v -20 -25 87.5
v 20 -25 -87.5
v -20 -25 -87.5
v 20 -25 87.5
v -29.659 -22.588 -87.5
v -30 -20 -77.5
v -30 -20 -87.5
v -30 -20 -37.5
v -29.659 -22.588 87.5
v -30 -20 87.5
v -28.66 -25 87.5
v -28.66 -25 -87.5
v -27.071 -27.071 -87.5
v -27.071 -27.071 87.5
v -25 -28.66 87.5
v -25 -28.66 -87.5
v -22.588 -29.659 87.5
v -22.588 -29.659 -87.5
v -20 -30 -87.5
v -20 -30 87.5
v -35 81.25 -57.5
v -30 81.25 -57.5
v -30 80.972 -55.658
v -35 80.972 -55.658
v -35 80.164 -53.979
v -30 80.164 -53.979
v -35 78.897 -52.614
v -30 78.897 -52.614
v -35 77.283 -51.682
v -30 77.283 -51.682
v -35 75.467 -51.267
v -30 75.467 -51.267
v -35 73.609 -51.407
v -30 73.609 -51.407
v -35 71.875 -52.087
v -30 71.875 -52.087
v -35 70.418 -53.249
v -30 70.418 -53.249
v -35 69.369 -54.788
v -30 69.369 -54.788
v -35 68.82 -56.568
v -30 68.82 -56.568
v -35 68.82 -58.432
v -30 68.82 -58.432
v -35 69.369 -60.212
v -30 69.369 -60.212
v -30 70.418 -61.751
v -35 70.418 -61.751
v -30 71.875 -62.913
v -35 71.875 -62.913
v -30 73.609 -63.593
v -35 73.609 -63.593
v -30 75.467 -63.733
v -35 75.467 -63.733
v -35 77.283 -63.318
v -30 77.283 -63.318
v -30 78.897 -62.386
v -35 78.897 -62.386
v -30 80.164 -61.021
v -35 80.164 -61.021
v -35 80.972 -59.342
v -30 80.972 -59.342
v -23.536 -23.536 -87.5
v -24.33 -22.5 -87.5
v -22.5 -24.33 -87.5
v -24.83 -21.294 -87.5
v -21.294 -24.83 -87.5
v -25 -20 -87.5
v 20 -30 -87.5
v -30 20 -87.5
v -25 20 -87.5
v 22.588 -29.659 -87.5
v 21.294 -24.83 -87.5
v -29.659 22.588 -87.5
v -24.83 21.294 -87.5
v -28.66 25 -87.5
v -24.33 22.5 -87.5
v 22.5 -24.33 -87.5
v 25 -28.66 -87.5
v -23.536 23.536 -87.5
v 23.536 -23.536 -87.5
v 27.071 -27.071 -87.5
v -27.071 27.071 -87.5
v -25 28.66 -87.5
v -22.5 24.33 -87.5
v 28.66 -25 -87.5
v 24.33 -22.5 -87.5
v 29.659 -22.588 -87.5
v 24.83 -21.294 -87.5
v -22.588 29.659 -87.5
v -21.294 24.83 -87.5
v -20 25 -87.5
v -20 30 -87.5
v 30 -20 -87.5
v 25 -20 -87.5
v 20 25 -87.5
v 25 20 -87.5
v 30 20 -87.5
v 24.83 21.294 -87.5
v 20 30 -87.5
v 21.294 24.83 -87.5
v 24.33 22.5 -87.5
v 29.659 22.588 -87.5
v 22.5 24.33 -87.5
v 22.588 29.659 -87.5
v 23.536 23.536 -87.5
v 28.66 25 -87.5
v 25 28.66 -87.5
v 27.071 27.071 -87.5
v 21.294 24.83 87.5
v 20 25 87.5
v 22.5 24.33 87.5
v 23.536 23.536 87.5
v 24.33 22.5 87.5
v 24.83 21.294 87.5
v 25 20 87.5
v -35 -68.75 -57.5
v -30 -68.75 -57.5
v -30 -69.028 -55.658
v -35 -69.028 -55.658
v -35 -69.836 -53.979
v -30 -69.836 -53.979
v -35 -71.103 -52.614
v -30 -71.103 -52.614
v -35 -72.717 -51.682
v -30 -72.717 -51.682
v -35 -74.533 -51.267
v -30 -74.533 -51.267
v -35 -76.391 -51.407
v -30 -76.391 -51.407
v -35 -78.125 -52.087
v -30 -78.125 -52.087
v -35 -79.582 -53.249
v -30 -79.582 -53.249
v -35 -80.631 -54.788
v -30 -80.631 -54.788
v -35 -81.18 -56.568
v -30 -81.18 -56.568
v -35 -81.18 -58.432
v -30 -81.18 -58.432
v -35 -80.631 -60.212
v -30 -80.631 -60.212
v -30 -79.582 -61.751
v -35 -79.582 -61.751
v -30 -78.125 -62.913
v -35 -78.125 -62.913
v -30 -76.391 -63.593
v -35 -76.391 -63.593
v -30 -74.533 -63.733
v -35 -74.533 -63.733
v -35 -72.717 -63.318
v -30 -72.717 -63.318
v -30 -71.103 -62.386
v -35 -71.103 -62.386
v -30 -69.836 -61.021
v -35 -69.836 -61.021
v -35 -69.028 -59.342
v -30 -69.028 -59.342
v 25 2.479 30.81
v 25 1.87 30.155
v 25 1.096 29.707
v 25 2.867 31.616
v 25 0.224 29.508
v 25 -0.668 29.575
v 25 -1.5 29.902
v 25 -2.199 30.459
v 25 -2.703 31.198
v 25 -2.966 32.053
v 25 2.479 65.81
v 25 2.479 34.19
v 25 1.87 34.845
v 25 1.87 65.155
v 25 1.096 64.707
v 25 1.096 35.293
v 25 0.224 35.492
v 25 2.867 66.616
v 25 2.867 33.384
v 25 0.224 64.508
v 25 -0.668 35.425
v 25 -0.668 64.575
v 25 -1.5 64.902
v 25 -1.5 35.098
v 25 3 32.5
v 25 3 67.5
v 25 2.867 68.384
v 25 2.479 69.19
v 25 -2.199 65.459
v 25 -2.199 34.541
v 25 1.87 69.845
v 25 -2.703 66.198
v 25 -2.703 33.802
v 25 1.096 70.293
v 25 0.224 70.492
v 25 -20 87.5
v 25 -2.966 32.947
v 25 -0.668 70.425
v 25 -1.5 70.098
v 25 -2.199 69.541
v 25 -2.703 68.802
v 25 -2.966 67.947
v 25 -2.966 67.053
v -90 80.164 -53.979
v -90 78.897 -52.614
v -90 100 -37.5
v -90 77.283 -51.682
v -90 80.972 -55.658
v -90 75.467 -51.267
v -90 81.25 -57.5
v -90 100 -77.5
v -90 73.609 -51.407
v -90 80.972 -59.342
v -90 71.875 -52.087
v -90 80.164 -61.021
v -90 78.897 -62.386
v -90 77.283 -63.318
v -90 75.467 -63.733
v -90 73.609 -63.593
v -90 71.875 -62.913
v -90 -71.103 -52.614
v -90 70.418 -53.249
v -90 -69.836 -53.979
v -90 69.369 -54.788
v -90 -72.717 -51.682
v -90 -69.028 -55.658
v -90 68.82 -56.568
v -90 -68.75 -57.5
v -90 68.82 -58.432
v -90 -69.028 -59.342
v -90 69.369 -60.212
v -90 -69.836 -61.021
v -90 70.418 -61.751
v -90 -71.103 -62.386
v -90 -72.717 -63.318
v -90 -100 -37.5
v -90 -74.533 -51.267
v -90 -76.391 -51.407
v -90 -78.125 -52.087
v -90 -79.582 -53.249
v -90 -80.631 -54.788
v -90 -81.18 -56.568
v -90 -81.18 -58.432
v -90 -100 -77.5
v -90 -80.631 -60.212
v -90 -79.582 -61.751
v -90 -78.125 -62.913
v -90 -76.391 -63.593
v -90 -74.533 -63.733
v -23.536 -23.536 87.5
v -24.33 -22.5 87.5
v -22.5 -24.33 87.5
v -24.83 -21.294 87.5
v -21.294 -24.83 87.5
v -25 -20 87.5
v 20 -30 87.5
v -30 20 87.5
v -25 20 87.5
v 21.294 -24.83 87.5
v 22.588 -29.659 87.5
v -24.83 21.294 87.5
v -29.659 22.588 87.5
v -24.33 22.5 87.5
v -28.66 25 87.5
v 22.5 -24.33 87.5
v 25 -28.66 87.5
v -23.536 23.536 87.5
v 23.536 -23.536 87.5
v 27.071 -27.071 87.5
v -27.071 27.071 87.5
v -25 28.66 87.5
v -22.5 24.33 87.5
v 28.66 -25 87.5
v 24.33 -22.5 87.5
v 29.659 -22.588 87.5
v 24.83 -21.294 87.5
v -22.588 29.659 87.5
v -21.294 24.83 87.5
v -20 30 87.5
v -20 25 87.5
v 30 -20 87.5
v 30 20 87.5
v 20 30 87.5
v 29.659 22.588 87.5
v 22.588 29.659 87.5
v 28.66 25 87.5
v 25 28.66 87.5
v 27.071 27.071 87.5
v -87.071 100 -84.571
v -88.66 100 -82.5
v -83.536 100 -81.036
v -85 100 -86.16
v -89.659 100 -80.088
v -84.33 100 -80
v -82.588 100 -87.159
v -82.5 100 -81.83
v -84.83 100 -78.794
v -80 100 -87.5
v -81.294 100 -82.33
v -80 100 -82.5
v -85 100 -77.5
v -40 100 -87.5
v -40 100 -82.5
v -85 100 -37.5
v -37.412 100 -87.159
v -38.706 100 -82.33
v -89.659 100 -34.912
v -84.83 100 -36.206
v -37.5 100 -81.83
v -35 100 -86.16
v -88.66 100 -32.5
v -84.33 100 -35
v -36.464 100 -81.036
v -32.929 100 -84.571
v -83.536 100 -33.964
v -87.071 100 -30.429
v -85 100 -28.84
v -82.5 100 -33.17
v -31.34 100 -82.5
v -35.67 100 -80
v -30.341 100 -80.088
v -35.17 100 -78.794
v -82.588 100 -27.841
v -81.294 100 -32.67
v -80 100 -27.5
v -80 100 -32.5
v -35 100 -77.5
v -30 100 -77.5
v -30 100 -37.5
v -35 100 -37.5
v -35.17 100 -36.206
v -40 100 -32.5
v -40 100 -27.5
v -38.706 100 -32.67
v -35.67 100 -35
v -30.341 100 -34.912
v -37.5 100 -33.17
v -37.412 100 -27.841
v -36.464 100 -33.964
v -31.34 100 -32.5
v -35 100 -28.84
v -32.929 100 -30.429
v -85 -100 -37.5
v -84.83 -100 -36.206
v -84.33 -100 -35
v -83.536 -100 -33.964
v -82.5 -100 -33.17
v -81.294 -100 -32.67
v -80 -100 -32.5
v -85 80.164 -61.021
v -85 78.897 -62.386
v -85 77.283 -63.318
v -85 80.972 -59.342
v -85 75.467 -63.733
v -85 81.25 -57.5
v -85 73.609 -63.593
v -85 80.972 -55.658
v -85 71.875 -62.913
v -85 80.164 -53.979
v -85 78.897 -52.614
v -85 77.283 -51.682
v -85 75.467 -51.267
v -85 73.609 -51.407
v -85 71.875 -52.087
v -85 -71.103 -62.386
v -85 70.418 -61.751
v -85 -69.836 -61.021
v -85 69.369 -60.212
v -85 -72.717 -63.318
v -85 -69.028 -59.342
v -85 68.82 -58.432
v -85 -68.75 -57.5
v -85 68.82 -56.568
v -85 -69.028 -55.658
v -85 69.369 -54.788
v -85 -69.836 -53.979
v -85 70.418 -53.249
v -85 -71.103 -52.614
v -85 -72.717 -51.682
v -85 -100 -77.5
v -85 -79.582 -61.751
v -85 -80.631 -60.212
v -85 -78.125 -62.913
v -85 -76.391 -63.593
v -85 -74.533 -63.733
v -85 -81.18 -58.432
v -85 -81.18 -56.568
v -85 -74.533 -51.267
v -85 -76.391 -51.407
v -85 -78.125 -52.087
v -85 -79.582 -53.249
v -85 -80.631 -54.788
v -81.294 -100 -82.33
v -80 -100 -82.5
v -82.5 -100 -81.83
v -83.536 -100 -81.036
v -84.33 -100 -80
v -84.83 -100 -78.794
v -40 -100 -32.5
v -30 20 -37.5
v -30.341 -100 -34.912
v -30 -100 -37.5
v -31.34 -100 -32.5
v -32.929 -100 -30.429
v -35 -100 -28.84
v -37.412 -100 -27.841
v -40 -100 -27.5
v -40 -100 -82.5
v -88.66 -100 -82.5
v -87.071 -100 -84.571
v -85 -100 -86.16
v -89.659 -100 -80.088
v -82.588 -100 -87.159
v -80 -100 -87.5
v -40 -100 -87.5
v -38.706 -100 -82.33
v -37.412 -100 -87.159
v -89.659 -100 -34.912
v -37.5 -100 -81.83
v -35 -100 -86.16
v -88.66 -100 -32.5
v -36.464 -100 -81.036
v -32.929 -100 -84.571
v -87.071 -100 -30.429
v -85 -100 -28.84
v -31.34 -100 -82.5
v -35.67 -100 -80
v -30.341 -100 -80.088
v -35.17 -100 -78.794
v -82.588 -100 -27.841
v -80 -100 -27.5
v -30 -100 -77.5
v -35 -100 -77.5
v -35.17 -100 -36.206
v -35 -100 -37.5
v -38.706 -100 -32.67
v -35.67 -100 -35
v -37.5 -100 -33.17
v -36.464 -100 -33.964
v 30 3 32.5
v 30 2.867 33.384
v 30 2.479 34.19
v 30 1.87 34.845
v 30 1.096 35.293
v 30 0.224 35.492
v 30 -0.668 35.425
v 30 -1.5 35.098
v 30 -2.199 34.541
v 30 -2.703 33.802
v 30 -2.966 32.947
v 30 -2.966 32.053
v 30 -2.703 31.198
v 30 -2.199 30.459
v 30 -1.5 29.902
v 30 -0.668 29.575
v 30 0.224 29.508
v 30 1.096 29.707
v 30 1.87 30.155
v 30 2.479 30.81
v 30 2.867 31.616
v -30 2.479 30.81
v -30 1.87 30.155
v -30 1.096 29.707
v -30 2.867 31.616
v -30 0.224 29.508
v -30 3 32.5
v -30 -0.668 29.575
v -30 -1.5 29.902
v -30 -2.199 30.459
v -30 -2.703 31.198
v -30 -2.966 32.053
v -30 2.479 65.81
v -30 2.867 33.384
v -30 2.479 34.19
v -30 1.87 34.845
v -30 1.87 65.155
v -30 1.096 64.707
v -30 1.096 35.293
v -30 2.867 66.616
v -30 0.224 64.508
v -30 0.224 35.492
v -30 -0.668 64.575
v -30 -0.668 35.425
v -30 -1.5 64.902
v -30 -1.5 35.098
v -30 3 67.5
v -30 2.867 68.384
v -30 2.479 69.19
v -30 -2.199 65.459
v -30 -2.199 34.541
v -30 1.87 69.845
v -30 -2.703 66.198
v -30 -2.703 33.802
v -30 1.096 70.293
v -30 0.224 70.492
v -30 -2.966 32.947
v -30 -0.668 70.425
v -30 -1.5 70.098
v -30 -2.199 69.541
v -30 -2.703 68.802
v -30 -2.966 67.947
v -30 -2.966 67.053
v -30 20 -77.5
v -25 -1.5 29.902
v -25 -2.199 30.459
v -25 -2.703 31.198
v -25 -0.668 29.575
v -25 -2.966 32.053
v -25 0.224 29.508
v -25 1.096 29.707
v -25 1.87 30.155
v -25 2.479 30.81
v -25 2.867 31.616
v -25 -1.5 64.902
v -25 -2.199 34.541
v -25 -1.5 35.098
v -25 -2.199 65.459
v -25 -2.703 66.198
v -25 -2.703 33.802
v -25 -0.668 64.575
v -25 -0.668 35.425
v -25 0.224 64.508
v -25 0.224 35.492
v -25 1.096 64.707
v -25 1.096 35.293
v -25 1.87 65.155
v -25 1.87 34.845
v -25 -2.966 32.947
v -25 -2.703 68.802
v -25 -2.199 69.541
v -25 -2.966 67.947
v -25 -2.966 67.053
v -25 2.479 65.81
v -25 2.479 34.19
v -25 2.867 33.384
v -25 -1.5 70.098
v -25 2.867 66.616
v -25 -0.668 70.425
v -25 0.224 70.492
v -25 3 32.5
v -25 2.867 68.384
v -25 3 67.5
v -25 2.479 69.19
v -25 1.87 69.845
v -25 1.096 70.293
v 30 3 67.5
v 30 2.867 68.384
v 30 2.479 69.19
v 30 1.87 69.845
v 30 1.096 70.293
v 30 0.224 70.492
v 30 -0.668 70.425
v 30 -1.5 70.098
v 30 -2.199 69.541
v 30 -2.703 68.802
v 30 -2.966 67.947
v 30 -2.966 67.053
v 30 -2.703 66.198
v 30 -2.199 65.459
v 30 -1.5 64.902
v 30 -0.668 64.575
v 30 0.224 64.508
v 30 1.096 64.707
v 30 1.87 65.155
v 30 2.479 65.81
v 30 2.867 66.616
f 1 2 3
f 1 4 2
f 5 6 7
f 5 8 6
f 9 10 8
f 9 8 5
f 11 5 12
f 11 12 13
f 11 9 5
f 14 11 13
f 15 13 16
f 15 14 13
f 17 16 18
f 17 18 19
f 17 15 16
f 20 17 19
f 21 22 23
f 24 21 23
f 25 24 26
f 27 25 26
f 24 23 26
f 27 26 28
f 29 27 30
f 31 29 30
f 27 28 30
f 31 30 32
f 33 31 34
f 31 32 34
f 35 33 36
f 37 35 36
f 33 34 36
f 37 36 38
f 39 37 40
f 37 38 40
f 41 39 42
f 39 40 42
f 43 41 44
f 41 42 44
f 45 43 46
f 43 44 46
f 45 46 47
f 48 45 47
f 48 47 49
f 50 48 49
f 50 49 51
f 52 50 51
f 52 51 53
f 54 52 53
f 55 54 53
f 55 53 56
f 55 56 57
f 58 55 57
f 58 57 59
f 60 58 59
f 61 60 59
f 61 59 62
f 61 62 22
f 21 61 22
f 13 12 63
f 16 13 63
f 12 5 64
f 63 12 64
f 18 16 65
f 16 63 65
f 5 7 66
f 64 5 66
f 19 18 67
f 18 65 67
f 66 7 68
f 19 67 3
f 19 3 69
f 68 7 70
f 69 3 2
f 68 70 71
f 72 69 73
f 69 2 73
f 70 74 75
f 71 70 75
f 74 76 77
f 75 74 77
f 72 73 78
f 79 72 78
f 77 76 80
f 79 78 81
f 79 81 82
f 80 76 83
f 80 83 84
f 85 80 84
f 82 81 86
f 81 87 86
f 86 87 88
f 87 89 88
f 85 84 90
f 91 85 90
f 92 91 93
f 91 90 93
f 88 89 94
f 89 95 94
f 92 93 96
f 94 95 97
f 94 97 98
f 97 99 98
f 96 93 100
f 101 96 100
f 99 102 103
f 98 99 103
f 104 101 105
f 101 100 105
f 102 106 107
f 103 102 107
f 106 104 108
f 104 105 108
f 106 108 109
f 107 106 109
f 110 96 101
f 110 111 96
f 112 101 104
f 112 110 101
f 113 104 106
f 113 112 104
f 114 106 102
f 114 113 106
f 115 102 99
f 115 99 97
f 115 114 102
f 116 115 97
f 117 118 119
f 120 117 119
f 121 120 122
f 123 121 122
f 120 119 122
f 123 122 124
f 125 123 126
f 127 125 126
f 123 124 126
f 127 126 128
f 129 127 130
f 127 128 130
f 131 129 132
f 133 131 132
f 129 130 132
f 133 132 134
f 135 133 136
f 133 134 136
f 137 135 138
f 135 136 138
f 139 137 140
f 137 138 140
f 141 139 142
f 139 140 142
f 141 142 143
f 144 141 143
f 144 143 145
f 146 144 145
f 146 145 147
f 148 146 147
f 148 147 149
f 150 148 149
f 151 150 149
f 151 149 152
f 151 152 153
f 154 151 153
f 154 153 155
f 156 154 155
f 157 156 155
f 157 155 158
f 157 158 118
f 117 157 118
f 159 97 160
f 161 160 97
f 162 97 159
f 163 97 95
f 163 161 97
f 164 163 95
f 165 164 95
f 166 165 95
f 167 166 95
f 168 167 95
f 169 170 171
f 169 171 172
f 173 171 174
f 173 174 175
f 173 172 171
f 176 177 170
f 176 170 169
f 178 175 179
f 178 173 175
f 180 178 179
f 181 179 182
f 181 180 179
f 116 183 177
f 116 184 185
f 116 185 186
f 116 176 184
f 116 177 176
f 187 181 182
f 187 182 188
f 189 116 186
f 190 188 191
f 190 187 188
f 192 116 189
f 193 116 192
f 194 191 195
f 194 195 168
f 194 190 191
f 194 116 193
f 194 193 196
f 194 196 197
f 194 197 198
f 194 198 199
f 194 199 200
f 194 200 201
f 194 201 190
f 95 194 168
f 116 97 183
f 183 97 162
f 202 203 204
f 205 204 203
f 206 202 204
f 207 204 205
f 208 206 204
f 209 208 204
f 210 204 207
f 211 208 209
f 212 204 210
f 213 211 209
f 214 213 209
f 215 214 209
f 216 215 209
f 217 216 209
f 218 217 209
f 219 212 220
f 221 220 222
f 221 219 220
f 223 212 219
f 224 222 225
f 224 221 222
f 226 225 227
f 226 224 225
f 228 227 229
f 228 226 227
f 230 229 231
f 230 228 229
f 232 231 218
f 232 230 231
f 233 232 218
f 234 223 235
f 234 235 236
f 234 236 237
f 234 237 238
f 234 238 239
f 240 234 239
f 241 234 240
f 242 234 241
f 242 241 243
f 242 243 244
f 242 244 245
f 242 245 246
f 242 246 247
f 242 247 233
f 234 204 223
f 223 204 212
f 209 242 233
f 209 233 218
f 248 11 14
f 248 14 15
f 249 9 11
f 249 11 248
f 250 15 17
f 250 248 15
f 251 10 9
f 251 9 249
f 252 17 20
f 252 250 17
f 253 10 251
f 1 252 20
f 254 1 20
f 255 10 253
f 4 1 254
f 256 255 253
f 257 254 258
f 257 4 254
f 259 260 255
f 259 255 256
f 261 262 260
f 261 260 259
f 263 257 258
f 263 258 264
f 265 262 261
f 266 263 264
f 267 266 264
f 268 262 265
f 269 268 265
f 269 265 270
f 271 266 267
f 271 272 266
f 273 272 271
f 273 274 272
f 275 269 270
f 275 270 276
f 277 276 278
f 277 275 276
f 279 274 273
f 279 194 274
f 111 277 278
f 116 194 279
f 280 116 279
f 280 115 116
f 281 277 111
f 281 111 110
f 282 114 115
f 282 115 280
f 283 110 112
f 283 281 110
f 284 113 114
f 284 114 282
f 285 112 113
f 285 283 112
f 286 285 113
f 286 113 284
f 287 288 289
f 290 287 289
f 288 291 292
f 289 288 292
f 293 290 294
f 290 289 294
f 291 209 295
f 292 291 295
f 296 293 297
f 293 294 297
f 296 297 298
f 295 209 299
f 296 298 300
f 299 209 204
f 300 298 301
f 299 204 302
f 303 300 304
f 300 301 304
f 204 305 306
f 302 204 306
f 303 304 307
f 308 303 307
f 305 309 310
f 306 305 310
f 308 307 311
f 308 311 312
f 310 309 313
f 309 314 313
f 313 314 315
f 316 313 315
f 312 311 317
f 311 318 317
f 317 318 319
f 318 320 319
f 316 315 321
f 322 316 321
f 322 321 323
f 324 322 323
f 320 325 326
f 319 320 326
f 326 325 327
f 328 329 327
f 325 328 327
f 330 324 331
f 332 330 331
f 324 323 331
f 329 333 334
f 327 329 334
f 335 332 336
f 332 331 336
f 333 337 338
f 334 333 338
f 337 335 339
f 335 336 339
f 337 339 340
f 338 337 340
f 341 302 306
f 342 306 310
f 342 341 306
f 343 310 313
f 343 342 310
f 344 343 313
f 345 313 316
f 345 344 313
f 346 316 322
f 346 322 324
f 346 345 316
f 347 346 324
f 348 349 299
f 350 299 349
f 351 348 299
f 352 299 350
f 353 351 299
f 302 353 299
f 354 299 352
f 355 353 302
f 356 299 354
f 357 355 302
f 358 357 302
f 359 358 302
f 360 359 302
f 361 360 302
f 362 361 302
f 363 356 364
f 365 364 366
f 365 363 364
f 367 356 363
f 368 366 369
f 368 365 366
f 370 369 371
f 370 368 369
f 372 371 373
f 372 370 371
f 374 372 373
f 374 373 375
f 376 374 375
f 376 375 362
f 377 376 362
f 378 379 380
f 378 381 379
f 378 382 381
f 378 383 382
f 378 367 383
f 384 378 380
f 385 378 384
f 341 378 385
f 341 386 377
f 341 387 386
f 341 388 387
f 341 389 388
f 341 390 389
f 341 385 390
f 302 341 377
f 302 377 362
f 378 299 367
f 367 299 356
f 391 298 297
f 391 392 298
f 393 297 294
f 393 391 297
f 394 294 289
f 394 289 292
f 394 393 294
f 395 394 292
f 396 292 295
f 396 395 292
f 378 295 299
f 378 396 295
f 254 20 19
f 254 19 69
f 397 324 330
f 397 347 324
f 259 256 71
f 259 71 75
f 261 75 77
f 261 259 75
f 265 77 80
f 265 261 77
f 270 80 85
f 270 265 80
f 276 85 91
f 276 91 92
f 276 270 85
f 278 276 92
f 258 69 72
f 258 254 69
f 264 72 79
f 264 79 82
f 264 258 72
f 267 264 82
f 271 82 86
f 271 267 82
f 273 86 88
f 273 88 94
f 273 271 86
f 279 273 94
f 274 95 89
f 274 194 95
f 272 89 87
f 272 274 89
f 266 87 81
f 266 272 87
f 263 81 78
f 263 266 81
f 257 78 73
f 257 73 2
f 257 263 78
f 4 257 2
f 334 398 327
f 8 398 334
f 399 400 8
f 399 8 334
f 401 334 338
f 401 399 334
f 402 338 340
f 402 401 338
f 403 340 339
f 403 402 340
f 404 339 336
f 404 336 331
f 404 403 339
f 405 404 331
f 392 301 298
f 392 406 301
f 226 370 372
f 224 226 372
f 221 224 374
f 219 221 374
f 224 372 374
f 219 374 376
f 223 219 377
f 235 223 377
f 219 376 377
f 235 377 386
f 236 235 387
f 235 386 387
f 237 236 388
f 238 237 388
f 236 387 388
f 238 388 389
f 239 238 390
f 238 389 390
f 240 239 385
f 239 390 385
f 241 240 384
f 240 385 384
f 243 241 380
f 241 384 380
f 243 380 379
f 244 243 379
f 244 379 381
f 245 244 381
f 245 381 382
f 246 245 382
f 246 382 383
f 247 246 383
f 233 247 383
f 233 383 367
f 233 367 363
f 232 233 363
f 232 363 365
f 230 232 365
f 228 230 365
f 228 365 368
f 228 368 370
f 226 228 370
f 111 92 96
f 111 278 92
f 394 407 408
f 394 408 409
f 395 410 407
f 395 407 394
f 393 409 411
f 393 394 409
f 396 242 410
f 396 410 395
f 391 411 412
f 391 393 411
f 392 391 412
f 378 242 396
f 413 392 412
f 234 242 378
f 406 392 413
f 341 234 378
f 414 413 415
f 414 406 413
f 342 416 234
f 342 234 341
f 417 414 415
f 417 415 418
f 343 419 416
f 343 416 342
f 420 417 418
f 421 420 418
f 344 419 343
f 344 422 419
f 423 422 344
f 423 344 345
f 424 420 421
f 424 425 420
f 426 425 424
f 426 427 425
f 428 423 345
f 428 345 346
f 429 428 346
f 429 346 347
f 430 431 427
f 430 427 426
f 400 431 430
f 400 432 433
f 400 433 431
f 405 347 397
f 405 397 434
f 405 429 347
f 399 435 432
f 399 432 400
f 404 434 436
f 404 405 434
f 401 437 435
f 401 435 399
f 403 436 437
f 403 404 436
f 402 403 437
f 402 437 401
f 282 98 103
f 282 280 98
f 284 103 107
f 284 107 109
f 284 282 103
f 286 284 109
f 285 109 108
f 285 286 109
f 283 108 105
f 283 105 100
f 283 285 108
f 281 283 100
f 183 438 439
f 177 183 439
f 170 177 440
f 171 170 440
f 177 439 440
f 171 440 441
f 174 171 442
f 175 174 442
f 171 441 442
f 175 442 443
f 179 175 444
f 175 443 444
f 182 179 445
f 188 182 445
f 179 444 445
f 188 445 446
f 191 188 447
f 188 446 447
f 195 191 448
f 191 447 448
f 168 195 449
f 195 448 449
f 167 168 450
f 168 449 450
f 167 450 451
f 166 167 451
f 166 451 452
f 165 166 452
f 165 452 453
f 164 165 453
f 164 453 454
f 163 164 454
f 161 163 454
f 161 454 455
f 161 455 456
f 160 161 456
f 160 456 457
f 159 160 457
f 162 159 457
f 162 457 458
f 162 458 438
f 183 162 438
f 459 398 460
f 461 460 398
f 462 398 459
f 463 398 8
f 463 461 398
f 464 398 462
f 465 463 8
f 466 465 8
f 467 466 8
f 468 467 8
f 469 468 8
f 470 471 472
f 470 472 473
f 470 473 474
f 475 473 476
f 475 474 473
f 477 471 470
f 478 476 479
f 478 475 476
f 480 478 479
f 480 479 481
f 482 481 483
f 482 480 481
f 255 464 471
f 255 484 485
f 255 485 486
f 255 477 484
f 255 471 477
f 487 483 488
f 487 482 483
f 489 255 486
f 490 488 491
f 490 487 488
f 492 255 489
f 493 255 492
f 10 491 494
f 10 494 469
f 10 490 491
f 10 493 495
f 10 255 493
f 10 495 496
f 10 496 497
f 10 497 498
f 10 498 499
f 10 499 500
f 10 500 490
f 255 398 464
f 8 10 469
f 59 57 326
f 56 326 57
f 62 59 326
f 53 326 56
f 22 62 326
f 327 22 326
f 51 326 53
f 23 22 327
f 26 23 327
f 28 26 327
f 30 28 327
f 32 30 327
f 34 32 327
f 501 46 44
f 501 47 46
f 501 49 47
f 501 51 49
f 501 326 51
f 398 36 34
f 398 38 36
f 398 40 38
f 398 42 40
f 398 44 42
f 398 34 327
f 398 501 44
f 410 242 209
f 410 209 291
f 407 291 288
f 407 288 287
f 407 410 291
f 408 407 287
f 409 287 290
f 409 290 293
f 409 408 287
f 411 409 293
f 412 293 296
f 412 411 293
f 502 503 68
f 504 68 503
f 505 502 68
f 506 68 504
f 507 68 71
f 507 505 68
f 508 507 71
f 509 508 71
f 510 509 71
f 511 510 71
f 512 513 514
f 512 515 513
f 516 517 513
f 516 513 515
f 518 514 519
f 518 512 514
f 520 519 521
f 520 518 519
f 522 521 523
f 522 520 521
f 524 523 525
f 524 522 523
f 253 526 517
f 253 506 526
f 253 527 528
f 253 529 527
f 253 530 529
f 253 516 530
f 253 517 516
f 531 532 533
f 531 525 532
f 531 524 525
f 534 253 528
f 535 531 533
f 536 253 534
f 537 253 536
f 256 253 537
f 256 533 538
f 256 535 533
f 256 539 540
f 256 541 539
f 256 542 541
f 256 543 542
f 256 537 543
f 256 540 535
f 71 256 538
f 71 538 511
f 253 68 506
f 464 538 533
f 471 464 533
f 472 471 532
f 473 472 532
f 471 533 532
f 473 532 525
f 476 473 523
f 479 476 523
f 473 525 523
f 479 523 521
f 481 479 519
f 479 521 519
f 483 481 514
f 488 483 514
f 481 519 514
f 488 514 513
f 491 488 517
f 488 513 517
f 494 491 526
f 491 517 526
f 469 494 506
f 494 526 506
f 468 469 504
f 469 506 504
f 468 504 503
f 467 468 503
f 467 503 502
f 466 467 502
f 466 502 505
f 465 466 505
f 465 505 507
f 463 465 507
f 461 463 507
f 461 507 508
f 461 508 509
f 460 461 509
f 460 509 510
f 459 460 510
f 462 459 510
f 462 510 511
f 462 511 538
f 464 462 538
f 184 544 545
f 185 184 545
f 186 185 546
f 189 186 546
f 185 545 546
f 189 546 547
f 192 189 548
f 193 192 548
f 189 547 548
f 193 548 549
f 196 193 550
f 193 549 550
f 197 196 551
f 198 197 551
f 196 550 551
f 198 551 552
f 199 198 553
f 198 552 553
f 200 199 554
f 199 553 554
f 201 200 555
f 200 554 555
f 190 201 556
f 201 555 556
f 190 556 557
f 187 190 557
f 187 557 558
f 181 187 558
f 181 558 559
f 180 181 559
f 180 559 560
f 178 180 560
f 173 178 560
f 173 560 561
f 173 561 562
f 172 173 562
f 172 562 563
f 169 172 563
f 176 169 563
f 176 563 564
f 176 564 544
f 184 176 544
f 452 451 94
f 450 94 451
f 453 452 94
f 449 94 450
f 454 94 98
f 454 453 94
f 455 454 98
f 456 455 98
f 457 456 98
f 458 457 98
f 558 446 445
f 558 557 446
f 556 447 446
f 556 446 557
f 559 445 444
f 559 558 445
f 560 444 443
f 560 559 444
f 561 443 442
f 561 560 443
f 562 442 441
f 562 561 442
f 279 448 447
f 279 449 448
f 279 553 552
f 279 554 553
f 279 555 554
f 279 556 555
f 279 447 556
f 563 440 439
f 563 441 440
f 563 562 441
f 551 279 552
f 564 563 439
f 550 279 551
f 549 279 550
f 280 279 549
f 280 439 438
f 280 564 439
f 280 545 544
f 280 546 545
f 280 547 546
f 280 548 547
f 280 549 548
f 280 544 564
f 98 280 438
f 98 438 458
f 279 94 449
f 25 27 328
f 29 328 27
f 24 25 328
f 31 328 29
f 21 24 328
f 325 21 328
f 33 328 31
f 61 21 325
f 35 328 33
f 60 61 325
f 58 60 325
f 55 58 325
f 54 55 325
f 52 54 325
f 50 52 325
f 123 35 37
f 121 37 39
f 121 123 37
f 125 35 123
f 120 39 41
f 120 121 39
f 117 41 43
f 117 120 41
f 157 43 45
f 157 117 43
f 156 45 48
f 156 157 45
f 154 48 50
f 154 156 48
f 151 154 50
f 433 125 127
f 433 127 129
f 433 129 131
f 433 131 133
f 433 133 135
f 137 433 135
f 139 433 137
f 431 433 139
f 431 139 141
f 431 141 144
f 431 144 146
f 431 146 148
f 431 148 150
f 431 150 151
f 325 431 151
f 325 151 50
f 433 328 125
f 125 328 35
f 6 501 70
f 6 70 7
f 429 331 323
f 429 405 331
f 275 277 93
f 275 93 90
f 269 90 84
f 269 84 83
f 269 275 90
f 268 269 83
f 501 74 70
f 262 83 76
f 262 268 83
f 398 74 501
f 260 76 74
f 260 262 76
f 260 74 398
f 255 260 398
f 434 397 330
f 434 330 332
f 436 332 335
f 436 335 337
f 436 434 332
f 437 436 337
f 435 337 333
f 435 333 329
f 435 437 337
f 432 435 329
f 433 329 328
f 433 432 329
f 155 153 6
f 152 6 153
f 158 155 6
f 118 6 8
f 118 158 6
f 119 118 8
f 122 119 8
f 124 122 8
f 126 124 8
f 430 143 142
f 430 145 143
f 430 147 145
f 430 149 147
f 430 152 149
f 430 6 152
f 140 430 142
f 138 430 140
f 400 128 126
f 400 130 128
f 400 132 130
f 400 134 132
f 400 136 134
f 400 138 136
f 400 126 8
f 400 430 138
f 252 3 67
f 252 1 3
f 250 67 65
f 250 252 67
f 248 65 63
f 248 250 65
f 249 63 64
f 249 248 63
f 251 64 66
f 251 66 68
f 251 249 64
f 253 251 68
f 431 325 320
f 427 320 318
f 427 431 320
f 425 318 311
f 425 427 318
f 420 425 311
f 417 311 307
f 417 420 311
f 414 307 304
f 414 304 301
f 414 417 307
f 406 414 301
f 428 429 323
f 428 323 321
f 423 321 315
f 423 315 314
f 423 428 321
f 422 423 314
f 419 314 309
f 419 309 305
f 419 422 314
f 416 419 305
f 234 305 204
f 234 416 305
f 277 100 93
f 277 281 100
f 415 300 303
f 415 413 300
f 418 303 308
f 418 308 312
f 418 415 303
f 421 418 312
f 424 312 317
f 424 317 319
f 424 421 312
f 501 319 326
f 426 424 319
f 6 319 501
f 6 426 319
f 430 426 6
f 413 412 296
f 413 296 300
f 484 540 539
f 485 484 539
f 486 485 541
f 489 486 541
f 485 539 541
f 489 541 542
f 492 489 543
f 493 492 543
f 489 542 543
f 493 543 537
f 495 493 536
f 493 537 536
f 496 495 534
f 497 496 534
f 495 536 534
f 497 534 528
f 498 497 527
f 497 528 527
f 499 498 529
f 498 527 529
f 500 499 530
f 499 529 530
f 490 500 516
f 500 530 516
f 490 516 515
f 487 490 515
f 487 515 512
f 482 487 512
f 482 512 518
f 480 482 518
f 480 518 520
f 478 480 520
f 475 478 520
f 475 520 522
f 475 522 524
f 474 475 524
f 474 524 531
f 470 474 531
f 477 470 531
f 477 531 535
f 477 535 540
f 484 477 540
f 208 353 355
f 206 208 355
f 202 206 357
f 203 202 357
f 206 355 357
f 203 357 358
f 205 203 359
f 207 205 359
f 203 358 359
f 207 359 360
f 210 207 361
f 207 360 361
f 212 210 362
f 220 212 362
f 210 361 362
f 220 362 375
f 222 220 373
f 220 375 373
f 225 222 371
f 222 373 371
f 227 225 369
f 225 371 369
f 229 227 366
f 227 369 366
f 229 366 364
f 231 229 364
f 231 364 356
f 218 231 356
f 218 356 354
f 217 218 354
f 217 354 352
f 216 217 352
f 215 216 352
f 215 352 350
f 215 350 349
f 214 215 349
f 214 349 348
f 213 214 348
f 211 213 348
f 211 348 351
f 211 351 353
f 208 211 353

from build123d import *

# Parameters (mm, degrees)
F1_DEPTH = 87.5
F3_DEPTH = 100
F4_R     = 6.25
F5_DEPTH = 60.001
F6_R     = 3
F7_DEPTH = 120.001


with BuildPart() as f1:
    # F0 (on Top) → F1 (new body, symmetric)
    with BuildSketch(Plane.XY):
        with BuildLine():
            Line((20, 30), (-20, 30))
            ThreePointArc((-20, 30), (-27.071068, 27.071068), (-30, 20))
            Line((-30, 20), (-30, -20))
            ThreePointArc((-30, -20), (-27.071068, -27.071068), (-20, -30))
            Line((-20, -30), (20, -30))
            ThreePointArc((20, -30), (27.071068, -27.071068), (30, -20))
            Line((30, -20), (30, 20))
            ThreePointArc((30, 20), (27.071068, 27.071068), (20, 30))
        make_face()
        with BuildLine():
            ThreePointArc((-25, 20), (-23.535534, 23.535534), (-20, 25))
            Line((-20, 25), (20, 25))
            ThreePointArc((20, 25), (23.535534, 23.535534), (25, 20))
            Line((25, 20), (25, -20))
            ThreePointArc((25, -20), (23.535534, -23.535534), (20, -25))
            Line((20, -25), (-20, -25))
            ThreePointArc((-20, -25), (-23.535534, -23.535534), (-25, -20))
            Line((-25, -20), (-25, 20))
        make_face(mode=Mode.SUBTRACT)
    extrude(amount=F1_DEPTH, both=True)

    # F2 (on Front) → F3 (join, symmetric)
    with BuildSketch(Plane.XZ):
        with BuildLine():
            Line((-40, -27.5), (-80, -27.5))
            ThreePointArc((-80, -27.5), (-87.071068, -30.428932), (-90, -37.5))
            Line((-90, -37.5), (-90, -77.5))
            ThreePointArc((-90, -77.5), (-87.071068, -84.571068), (-80, -87.5))
            Line((-80, -87.5), (-40, -87.5))
            ThreePointArc((-40, -87.5), (-32.928932, -84.571068), (-30, -77.5))
            Line((-30, -77.5), (-30, -37.5))
            ThreePointArc((-30, -37.5), (-32.928932, -30.428932), (-40, -27.5))
        make_face()
        with BuildLine():
            ThreePointArc((-40, -32.5), (-36.464466, -33.964466), (-35, -37.5))
            Line((-35, -37.5), (-35, -77.5))
            ThreePointArc((-35, -77.5), (-36.464466, -81.035534), (-40, -82.5))
            Line((-40, -82.5), (-80, -82.5))
            ThreePointArc((-80, -82.5), (-83.535534, -81.035534), (-85, -77.5))
            Line((-85, -77.5), (-85, -37.5))
            ThreePointArc((-85, -37.5), (-83.535534, -33.964466), (-80, -32.5))
            Line((-80, -32.5), (-40, -32.5))
        make_face(mode=Mode.SUBTRACT)
    extrude(amount=F3_DEPTH, both=True)

    # F4 (on face) → F5 (cut, through all)
    with BuildSketch(Plane.YZ.offset(-30)):
        with Locations((-75, -57.5)):
            Circle(F4_R)
        with Locations((75, -57.5)):
            Circle(F4_R)
    extrude(amount=-F5_DEPTH, mode=Mode.SUBTRACT)

    # F6 (on face) → F7 (cut, through all)
    with BuildSketch(Plane.YZ.offset(30)):
        with Locations((0, 32.5)):
            Circle(F6_R)
        with Locations((0, 67.5)):
            Circle(F6_R)
    extrude(amount=-F7_DEPTH, mode=Mode.SUBTRACT)


solid = f1.part
